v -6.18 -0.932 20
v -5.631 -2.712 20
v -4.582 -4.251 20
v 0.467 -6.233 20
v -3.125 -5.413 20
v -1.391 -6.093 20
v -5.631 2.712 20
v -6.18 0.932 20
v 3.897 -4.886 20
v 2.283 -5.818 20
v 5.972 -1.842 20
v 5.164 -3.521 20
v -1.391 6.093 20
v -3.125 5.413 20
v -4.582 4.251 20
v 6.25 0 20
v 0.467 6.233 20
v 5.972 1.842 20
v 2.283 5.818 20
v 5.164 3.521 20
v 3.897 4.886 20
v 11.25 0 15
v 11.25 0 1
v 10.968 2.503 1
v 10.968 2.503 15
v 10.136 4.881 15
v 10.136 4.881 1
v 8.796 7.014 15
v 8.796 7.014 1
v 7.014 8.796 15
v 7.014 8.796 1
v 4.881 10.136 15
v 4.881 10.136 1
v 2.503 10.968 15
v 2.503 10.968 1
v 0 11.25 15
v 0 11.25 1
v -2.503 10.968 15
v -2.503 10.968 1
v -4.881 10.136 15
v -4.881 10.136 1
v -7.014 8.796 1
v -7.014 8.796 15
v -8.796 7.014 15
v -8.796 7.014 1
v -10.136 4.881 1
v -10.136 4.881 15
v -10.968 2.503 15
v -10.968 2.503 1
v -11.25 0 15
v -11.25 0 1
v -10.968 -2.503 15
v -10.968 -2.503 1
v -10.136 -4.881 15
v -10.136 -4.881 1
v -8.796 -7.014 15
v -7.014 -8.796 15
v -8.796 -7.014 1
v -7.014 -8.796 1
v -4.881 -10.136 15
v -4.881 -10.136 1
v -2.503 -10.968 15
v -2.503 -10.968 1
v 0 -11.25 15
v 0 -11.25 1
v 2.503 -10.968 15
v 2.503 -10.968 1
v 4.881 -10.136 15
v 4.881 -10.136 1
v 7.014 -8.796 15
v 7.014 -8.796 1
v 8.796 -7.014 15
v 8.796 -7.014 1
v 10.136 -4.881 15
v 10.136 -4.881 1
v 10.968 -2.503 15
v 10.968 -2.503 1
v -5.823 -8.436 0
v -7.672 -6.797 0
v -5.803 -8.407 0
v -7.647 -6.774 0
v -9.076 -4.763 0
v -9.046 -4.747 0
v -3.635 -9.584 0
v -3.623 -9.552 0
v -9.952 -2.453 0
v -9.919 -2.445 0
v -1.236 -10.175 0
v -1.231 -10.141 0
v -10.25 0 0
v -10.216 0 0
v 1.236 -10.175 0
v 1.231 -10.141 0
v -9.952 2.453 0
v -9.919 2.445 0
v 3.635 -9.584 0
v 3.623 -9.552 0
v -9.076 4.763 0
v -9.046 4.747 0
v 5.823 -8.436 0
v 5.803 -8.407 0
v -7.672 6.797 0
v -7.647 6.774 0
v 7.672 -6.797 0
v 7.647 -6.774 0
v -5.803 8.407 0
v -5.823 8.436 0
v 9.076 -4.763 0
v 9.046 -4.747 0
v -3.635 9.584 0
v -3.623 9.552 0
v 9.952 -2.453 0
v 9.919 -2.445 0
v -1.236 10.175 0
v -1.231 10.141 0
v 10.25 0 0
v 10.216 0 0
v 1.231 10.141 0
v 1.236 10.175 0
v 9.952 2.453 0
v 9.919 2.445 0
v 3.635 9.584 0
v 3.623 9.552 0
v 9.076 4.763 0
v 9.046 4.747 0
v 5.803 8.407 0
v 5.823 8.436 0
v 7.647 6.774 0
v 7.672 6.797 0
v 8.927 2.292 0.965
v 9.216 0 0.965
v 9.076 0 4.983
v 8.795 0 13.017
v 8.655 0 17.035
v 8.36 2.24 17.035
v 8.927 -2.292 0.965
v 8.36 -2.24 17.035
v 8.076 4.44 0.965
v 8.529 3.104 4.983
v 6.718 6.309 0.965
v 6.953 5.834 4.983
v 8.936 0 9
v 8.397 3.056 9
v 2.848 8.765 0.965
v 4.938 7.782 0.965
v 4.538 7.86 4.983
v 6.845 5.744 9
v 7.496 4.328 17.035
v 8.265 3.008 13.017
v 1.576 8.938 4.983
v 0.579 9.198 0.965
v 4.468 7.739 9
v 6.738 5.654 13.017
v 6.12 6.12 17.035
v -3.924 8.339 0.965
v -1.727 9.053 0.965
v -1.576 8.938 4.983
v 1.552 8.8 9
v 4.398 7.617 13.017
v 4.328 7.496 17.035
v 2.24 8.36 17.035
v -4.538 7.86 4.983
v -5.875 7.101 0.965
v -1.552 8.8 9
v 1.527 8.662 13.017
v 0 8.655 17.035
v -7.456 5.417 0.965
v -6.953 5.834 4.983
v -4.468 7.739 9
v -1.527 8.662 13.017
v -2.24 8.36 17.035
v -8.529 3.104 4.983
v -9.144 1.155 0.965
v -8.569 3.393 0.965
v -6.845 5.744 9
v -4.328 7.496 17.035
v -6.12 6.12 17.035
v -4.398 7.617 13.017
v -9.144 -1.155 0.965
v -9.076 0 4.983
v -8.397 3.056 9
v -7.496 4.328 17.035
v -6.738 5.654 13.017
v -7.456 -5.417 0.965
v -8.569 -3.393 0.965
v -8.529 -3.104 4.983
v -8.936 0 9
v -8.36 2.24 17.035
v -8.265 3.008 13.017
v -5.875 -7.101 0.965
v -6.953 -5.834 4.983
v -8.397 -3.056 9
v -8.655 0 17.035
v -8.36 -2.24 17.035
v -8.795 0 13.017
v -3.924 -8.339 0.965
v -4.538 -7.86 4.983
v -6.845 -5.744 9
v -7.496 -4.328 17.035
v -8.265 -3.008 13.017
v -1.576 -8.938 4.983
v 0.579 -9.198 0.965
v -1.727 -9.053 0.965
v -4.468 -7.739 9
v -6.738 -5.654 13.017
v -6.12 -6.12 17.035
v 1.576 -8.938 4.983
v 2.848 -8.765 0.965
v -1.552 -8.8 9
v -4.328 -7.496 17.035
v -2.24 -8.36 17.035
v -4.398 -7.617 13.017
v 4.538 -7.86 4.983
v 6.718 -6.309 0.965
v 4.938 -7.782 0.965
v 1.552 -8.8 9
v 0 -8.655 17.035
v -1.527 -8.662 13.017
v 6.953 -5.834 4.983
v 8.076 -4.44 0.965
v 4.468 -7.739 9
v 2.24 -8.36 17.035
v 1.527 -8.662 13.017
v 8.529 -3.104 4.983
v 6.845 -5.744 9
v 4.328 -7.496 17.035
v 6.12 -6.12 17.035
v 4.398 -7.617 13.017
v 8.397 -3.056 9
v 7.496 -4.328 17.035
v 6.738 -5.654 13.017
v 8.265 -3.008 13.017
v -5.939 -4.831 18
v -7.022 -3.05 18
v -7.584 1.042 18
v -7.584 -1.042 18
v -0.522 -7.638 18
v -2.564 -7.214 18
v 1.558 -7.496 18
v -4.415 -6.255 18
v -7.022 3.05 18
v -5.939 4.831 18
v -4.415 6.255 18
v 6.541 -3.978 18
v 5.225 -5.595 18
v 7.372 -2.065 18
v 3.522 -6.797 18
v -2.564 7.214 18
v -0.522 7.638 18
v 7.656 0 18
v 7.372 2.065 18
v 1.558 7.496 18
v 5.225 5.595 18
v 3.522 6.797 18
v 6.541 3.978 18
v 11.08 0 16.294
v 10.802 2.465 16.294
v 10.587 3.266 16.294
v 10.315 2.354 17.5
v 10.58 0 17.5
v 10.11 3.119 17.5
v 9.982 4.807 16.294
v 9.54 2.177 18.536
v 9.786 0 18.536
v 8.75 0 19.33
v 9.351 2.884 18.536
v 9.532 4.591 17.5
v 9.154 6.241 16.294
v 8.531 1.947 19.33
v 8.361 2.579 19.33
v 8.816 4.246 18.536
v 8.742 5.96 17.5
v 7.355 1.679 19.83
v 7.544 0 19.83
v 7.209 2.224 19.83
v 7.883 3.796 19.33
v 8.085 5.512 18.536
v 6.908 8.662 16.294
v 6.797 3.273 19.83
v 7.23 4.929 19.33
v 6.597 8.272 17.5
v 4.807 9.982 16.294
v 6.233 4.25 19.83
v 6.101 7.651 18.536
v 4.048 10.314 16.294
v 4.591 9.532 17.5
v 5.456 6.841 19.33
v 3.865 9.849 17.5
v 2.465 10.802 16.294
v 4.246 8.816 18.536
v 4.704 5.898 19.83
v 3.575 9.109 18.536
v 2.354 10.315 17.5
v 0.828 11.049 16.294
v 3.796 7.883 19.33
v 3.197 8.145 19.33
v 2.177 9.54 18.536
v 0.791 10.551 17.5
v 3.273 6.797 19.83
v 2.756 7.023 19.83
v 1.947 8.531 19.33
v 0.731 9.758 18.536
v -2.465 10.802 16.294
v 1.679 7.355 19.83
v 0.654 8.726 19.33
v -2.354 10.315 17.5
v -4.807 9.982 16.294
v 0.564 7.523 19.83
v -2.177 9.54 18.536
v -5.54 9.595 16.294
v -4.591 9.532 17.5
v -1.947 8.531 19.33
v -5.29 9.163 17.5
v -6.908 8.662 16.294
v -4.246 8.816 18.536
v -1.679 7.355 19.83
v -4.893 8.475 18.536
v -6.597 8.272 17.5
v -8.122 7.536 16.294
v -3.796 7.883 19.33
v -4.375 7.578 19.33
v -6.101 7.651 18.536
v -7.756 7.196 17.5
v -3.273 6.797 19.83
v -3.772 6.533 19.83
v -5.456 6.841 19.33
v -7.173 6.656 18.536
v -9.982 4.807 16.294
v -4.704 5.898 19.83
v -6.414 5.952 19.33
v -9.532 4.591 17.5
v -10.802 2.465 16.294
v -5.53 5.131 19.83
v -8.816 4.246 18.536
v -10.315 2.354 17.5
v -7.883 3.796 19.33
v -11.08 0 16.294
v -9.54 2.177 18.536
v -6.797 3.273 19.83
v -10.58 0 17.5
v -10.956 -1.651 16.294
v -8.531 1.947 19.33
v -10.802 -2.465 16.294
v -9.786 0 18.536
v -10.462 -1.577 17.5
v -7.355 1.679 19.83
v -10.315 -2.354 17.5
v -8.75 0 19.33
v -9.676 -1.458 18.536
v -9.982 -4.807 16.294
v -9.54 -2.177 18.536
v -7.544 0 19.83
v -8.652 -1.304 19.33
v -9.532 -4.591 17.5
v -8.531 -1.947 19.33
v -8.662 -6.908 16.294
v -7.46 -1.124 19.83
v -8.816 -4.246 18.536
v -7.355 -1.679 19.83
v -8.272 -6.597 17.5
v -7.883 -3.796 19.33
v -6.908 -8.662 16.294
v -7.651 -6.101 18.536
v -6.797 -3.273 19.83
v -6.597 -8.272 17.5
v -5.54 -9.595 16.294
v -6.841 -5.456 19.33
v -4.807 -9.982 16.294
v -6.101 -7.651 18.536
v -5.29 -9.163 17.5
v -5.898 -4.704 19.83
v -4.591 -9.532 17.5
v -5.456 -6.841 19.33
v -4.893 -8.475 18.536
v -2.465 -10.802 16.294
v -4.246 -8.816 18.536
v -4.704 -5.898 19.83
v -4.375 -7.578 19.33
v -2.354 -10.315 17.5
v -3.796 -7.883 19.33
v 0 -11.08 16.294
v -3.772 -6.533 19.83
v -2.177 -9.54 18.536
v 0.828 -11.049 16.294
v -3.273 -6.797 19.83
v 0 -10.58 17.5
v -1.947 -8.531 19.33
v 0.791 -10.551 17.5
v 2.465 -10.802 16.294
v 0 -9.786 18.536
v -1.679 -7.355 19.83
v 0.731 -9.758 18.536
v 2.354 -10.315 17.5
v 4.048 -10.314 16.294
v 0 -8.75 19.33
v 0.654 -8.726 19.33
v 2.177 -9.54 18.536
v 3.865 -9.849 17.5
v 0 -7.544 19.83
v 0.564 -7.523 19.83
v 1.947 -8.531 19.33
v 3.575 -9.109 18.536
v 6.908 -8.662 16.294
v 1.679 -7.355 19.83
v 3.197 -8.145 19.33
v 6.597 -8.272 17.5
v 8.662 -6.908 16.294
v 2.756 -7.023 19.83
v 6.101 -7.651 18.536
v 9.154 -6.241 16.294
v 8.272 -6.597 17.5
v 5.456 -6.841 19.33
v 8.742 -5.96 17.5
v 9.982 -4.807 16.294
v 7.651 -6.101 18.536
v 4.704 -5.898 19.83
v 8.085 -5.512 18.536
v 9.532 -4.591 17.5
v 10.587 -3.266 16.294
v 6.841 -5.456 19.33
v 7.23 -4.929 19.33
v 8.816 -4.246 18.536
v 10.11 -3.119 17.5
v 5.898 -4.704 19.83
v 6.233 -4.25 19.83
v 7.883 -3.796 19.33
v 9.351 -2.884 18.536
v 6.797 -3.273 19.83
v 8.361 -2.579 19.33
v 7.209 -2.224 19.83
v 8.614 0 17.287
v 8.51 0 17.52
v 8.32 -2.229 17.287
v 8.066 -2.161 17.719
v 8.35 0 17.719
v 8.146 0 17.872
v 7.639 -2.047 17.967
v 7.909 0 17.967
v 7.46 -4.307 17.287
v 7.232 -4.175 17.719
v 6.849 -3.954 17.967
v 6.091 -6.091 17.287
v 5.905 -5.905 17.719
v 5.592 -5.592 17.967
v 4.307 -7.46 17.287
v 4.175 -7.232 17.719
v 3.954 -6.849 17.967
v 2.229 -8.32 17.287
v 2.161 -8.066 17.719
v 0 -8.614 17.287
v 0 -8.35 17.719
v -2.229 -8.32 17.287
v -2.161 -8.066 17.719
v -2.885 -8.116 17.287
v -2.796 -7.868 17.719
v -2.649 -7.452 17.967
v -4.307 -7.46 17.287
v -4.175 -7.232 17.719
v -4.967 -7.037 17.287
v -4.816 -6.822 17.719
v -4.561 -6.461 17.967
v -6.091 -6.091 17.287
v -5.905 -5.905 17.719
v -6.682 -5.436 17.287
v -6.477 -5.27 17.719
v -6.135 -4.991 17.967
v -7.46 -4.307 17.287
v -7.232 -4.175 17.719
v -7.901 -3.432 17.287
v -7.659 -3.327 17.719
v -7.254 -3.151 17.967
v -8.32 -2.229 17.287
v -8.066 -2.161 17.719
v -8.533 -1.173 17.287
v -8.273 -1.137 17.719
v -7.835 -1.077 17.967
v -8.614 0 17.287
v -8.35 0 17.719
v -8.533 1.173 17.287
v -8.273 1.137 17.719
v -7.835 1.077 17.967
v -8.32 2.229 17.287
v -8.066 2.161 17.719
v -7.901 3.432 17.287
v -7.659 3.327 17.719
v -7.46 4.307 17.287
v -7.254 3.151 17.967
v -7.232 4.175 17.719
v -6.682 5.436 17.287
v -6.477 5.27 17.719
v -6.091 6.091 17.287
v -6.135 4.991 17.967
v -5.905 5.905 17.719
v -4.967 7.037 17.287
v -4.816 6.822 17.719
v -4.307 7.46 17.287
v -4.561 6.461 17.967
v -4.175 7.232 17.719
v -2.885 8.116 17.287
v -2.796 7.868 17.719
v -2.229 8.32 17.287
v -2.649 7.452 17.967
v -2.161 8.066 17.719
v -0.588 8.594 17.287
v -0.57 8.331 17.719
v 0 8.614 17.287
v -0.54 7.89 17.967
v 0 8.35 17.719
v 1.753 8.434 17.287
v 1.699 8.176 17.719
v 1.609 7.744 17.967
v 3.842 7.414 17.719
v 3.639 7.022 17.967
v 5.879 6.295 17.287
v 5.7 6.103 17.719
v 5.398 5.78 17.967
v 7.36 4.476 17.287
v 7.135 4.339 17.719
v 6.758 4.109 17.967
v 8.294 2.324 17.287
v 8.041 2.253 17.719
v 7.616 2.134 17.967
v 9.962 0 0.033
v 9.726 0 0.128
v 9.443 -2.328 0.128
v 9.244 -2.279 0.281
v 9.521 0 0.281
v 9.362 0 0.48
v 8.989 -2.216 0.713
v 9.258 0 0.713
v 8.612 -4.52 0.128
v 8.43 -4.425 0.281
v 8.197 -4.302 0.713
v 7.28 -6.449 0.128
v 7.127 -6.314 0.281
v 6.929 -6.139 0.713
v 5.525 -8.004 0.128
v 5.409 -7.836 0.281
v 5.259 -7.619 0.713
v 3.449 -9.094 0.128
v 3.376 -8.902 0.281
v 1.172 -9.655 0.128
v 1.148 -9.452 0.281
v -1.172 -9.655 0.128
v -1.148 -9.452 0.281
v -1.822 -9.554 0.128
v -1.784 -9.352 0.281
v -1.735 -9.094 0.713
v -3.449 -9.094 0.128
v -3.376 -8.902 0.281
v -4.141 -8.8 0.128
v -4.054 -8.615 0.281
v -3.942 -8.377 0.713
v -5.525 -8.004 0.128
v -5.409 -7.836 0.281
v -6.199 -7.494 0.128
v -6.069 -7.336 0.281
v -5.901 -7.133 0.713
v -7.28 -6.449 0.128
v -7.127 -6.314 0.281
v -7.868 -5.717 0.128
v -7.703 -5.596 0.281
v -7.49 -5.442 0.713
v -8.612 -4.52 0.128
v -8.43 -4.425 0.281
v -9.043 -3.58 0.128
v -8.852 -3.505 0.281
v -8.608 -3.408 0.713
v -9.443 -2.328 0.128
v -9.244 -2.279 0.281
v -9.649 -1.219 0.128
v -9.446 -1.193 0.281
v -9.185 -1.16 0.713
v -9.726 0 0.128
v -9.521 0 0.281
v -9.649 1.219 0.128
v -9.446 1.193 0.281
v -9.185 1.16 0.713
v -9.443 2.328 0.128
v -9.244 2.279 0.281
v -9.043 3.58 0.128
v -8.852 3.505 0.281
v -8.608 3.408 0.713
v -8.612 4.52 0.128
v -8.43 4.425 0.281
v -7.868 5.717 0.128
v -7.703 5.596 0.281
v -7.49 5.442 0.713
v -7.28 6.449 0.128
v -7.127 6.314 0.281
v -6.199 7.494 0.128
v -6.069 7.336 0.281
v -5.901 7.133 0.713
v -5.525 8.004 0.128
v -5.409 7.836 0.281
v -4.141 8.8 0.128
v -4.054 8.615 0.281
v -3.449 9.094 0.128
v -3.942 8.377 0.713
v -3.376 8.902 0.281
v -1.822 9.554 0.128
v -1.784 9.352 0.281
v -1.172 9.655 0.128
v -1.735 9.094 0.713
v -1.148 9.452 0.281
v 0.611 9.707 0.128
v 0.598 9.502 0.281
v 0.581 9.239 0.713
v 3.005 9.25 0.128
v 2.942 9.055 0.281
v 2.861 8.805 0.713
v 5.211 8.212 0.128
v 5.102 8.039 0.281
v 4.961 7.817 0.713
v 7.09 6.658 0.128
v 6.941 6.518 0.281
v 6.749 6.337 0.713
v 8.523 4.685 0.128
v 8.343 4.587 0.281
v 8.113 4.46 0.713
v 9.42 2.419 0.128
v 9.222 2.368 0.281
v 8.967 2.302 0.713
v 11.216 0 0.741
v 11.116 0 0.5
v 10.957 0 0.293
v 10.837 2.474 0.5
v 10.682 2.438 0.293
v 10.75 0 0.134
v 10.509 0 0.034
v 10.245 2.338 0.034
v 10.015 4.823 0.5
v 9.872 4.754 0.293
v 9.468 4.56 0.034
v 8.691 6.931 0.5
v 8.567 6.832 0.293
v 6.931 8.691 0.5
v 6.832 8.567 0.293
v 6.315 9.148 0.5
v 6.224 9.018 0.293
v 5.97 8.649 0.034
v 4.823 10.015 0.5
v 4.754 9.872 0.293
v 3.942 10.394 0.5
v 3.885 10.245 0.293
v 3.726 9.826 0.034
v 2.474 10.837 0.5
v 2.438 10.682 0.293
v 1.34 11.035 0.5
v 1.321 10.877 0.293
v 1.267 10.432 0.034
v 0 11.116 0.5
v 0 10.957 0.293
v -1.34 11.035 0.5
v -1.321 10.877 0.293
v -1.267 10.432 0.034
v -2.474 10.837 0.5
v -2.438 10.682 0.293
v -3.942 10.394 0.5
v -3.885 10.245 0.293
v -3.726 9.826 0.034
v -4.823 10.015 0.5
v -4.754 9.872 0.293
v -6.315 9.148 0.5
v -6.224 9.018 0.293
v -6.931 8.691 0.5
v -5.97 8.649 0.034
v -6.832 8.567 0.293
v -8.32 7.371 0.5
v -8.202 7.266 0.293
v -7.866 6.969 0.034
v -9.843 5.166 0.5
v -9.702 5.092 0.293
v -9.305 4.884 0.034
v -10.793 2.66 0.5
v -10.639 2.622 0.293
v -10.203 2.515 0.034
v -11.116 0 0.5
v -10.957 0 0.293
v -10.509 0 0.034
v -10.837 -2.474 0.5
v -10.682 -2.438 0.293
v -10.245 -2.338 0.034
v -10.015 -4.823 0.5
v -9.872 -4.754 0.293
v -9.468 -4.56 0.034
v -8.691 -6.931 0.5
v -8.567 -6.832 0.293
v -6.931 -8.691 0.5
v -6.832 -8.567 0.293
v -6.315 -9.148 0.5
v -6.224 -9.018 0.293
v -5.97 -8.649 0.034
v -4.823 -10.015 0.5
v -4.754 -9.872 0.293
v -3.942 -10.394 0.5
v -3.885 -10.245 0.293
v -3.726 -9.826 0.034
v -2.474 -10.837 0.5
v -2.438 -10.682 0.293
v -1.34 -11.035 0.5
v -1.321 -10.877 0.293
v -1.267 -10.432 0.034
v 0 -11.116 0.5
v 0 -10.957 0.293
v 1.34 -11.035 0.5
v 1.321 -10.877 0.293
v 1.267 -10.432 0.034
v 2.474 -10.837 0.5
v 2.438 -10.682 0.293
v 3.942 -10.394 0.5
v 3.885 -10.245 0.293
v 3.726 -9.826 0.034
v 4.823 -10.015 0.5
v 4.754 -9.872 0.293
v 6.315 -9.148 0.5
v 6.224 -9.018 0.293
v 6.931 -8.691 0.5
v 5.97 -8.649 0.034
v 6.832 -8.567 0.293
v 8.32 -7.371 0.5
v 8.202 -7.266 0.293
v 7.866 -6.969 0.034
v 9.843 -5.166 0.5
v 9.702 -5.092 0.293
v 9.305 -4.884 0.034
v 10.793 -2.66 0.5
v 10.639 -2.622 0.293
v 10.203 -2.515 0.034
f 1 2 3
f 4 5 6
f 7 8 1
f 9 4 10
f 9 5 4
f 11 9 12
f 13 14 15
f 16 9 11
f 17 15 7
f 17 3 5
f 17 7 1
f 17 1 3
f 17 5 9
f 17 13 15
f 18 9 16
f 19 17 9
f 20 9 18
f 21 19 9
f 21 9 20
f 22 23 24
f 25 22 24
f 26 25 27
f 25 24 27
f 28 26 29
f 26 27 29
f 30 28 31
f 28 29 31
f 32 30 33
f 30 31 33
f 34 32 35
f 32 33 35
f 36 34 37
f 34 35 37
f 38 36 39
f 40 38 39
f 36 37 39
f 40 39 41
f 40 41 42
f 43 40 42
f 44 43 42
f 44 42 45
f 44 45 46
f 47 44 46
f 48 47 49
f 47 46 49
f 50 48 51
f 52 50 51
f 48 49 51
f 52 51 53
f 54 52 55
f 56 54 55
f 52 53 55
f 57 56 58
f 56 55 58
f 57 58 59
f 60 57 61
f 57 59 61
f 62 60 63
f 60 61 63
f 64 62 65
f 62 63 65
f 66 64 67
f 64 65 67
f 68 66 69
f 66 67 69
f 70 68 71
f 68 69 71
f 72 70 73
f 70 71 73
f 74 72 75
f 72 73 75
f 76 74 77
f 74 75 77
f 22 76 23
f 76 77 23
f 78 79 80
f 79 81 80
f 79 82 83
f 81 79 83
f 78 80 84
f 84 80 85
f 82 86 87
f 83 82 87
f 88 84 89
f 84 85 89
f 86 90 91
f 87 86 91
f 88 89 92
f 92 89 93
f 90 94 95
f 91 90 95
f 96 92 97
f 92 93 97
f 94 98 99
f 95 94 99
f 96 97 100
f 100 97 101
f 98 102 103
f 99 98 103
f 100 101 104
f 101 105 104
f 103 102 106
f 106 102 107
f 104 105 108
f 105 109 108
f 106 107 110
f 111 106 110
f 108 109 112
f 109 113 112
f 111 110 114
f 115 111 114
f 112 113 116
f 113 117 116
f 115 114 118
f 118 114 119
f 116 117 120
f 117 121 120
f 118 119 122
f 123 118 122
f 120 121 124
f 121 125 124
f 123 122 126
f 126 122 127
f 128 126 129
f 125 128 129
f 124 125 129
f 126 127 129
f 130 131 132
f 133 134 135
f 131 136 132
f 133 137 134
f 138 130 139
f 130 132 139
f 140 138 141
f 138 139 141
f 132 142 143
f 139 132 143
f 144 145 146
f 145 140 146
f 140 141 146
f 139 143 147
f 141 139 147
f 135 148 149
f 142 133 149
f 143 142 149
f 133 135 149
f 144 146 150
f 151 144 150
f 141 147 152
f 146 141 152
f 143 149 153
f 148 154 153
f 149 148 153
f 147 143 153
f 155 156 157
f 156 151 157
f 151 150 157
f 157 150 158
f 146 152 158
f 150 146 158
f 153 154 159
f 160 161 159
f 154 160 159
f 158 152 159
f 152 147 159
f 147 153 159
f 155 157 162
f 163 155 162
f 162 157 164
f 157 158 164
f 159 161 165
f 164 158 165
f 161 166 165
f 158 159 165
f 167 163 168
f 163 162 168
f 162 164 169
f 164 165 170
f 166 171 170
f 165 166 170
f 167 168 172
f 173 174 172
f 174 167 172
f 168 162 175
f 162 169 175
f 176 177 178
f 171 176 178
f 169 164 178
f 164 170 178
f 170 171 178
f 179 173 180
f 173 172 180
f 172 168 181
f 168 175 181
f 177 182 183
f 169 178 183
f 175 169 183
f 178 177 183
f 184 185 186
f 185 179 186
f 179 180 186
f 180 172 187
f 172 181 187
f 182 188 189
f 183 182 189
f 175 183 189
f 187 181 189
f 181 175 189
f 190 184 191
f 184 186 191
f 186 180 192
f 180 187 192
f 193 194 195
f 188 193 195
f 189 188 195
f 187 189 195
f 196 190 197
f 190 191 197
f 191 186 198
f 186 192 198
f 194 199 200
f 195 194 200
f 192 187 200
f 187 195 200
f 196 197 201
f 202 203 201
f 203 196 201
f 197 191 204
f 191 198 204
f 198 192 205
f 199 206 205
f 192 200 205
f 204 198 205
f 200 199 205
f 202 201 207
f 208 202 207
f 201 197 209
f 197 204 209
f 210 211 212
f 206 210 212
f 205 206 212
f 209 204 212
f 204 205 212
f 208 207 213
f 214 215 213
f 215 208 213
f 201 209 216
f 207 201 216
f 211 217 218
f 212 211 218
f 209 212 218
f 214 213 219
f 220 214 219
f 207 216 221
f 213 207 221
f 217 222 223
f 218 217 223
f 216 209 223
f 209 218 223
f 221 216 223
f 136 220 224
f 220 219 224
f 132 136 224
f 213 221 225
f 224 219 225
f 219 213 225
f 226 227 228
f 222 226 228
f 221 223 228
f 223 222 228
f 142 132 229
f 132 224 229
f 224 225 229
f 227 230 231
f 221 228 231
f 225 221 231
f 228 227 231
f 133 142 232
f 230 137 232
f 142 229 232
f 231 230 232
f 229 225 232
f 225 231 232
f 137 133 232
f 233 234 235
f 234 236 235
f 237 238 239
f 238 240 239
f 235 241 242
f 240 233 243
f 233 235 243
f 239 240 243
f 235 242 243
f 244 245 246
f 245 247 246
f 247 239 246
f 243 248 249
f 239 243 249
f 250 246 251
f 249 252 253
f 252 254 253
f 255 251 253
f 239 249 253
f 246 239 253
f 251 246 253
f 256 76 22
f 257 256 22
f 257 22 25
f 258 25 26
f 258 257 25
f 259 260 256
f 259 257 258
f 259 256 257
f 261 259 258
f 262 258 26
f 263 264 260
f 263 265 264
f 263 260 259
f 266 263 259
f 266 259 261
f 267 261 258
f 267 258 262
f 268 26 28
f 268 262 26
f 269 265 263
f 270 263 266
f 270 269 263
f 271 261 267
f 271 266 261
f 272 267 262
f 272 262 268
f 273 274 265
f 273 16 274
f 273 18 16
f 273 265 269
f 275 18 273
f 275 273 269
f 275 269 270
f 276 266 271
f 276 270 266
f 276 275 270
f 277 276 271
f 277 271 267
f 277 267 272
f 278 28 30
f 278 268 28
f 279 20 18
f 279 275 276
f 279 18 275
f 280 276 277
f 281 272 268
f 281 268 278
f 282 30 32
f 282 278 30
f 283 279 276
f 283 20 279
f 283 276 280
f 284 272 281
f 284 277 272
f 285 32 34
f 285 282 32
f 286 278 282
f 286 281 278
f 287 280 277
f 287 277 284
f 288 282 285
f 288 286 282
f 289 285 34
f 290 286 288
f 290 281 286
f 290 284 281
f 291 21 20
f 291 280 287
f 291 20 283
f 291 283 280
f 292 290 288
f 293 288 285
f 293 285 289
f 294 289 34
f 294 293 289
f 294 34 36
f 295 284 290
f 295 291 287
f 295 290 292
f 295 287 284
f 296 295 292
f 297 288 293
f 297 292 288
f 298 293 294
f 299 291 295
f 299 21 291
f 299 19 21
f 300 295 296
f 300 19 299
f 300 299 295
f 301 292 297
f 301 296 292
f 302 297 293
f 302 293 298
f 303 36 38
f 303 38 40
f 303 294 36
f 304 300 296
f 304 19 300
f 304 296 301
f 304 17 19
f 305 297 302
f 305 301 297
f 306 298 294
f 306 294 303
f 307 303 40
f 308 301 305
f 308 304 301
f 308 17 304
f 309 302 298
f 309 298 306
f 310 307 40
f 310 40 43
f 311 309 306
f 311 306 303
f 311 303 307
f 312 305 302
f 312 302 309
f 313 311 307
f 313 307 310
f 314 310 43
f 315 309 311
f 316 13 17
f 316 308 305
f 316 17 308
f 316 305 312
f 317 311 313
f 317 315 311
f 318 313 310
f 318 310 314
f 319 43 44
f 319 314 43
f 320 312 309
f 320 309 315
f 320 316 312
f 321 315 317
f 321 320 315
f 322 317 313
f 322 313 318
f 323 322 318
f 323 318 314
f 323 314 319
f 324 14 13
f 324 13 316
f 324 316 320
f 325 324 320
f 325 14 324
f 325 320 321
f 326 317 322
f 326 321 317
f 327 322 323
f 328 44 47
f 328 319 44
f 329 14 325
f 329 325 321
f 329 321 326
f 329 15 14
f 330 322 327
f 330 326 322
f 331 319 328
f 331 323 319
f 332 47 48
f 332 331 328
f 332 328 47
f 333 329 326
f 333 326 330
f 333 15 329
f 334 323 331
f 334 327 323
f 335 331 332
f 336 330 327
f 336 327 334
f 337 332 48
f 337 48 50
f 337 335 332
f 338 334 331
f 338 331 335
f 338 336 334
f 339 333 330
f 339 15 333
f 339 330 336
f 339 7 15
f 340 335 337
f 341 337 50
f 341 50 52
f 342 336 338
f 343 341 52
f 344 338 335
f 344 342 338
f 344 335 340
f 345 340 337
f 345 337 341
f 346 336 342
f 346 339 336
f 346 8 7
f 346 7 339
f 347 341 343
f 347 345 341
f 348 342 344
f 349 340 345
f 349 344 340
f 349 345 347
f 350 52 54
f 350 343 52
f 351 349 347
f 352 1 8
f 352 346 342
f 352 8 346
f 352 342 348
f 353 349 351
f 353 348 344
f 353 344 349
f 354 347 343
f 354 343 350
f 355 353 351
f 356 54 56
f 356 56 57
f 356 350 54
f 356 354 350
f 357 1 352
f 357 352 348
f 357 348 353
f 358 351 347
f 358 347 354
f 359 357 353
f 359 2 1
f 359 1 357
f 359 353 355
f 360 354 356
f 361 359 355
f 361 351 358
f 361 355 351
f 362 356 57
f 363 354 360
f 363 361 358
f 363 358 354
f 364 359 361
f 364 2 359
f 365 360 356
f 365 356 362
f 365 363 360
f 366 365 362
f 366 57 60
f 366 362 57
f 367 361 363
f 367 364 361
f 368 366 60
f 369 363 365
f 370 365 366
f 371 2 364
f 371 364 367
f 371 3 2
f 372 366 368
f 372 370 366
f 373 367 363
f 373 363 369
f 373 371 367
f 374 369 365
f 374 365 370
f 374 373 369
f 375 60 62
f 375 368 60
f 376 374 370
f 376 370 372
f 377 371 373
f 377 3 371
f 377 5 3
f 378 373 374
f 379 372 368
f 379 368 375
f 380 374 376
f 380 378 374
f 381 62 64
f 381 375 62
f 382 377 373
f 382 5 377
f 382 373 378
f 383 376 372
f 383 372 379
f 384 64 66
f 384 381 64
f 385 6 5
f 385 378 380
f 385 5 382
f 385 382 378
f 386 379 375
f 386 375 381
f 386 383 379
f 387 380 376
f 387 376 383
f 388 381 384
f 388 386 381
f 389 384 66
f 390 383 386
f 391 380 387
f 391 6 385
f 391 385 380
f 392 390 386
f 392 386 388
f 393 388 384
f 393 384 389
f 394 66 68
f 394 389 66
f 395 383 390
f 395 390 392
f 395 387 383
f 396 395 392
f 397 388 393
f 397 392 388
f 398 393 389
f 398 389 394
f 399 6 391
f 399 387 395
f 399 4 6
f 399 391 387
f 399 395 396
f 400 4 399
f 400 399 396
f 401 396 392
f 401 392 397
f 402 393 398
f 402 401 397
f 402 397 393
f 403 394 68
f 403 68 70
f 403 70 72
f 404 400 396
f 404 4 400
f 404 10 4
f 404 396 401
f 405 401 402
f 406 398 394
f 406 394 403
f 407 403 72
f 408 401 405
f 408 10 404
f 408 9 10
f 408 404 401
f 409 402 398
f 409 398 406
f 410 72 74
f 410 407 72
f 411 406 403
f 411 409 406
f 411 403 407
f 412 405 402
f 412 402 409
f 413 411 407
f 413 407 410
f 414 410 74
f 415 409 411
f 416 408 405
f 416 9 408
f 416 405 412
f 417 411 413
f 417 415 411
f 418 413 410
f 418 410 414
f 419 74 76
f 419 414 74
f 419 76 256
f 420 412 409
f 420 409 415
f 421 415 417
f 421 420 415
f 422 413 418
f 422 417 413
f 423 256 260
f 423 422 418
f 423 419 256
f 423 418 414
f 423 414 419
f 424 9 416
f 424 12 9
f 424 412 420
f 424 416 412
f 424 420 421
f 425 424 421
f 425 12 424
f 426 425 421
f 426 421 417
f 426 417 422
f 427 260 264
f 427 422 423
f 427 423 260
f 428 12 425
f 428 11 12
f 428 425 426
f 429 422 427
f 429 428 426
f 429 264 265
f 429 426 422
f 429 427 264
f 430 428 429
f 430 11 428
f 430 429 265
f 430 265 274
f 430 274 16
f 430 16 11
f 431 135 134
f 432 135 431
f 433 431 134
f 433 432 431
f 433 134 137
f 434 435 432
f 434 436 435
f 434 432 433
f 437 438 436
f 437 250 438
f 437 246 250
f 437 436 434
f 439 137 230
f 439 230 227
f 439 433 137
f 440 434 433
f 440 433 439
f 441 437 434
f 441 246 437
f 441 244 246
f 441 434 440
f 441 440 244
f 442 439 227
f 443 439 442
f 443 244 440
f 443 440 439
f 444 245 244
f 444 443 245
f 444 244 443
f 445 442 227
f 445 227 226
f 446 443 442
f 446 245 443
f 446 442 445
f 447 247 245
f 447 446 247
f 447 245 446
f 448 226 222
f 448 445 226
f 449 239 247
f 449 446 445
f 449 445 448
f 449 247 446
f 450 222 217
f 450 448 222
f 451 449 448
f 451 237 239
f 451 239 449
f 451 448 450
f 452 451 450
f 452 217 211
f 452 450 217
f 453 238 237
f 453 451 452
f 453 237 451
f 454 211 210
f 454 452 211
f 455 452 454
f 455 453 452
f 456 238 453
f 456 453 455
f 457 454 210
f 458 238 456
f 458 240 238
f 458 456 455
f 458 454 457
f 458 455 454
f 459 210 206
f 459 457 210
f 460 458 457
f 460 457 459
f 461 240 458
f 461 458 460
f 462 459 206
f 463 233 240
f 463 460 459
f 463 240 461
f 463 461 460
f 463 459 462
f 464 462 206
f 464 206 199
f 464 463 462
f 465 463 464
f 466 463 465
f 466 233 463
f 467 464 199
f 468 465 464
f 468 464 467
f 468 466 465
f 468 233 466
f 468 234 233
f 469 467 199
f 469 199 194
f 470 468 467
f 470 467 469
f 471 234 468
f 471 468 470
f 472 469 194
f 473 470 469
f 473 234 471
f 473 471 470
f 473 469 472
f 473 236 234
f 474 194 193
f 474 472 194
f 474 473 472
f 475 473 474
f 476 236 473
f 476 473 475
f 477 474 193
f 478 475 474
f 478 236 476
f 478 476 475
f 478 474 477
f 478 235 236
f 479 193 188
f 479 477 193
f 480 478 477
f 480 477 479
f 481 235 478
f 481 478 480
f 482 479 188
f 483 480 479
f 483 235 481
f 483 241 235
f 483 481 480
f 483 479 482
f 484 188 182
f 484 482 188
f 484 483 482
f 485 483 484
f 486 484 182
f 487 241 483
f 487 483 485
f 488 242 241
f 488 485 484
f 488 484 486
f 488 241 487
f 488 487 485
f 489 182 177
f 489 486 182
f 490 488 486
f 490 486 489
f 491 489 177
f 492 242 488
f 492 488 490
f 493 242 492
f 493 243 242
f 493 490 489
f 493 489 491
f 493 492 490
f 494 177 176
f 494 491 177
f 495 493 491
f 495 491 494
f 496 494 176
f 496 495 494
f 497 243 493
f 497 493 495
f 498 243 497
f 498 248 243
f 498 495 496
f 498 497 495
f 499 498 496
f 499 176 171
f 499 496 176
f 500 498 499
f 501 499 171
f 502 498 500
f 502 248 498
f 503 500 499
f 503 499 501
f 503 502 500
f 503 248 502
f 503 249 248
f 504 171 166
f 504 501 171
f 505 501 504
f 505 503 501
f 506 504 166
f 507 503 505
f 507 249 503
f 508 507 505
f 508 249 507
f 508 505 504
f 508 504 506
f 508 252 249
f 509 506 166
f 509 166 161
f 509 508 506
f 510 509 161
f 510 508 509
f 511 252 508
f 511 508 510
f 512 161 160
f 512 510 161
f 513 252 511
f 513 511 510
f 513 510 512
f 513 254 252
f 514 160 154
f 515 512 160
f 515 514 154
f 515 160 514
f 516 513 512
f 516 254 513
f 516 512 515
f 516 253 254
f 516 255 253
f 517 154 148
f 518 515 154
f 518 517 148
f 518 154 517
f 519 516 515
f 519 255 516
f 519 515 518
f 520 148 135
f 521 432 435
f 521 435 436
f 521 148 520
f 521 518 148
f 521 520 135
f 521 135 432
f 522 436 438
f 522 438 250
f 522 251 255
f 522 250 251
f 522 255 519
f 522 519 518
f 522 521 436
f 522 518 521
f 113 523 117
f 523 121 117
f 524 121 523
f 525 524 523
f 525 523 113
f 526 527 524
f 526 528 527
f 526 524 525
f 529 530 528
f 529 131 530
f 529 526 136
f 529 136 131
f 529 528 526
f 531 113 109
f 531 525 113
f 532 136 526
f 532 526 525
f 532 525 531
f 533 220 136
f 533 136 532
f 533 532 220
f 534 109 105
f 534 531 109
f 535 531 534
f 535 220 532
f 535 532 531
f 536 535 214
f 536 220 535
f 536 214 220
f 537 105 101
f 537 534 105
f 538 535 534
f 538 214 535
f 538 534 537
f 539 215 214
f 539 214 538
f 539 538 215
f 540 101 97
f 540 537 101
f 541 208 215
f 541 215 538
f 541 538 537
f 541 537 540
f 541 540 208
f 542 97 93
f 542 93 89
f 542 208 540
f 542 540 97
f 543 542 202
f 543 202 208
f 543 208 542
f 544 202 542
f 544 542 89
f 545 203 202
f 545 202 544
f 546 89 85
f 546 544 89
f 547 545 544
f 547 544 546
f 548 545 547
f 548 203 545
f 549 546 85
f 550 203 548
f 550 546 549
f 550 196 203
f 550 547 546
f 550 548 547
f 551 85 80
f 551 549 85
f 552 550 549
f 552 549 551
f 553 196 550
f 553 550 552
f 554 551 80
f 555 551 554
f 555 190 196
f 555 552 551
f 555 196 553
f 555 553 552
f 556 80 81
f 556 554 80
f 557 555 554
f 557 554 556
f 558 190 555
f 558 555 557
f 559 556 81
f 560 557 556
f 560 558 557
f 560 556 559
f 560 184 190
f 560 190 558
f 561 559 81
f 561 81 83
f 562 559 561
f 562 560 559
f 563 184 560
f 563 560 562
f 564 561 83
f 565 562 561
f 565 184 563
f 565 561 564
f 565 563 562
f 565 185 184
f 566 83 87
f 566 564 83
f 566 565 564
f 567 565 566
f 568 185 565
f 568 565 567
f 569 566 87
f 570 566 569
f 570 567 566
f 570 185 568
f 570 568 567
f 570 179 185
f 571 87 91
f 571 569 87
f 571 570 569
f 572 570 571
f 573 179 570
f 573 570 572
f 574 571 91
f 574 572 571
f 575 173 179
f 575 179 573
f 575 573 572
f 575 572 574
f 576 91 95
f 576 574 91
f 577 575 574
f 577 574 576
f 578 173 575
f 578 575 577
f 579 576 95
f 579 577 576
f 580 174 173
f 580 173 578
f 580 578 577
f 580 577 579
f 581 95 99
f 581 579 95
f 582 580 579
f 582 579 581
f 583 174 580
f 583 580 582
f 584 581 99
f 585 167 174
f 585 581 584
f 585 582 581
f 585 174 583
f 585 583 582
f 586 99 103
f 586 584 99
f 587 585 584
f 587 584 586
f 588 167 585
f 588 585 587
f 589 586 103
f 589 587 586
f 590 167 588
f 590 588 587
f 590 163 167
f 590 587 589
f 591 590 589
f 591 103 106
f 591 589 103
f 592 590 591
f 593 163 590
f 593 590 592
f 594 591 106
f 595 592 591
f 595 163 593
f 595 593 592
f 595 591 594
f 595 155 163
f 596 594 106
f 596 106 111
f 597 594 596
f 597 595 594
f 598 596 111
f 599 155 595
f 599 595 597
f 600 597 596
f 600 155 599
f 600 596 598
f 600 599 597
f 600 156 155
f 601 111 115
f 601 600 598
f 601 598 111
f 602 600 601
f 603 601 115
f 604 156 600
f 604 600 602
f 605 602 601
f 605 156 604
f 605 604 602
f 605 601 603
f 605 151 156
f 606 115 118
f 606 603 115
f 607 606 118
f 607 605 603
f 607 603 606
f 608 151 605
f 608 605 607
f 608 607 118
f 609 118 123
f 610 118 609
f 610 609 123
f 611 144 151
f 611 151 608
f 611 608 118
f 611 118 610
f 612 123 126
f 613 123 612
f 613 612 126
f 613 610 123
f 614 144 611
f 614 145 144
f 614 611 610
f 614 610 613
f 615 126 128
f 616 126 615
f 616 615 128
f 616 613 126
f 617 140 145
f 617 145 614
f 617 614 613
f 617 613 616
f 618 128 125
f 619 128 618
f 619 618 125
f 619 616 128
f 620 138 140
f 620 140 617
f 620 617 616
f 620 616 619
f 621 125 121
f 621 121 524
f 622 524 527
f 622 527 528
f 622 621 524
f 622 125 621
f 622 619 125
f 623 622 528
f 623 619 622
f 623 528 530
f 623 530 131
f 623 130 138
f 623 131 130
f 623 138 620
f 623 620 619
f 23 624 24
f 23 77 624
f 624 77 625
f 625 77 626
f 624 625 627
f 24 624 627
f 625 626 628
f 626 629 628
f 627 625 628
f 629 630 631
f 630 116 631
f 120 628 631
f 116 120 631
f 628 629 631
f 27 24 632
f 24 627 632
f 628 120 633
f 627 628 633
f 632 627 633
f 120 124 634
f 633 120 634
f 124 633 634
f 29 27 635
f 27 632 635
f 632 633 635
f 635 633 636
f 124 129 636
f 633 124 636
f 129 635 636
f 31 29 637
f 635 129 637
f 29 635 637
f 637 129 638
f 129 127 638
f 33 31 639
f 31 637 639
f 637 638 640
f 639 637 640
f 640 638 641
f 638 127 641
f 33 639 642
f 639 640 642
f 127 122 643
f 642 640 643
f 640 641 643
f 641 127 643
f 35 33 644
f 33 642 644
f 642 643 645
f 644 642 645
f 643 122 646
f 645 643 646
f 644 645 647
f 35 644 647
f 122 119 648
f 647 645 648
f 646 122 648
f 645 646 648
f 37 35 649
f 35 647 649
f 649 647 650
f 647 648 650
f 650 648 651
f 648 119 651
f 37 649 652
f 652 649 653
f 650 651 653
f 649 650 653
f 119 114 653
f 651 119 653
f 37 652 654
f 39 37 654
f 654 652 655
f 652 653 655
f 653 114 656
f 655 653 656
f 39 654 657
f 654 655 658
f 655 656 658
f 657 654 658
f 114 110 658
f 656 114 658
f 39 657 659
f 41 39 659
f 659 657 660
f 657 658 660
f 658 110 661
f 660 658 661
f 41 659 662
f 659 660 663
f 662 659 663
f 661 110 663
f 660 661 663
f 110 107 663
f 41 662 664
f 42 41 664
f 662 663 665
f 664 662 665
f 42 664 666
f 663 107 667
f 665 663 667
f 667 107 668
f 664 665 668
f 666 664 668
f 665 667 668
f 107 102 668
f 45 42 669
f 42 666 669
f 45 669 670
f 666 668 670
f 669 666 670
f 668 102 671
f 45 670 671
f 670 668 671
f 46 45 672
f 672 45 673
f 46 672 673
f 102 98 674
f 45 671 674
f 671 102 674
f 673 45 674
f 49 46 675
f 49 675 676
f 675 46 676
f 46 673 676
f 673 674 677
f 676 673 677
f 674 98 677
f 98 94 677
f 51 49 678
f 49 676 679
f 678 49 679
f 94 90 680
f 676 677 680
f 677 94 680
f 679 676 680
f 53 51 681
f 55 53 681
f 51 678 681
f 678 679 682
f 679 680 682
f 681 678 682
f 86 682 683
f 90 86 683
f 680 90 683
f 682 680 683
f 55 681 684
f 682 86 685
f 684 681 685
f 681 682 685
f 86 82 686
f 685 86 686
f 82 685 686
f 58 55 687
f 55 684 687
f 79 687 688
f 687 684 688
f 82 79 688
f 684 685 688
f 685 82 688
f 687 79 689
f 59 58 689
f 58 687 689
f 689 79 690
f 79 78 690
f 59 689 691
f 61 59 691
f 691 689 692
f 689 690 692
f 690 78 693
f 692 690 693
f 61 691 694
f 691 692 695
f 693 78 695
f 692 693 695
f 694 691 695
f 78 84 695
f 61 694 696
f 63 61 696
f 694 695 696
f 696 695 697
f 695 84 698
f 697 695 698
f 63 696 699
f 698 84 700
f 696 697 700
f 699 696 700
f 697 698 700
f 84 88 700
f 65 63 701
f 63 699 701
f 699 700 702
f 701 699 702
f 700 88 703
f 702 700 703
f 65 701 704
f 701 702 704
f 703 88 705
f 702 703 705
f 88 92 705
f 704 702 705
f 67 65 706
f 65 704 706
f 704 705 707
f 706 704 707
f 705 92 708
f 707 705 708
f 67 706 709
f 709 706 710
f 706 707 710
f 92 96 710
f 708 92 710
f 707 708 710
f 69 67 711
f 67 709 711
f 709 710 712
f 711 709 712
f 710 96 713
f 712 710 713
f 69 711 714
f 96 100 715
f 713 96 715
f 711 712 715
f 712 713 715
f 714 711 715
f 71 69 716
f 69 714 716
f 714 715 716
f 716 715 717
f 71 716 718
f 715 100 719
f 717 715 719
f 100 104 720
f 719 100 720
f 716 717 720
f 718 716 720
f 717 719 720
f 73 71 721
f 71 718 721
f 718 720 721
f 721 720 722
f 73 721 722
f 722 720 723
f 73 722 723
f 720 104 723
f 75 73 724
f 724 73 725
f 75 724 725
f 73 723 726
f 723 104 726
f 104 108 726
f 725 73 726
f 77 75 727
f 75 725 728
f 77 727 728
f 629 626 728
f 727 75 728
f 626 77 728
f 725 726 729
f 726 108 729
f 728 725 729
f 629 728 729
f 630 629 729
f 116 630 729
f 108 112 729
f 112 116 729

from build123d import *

# Parameters (mm, degrees)
F0_R     = 11.25
F0_R_2   = 9.25
F1_DEPTH = 20
F2_DEPTH = 18
F2_TAPER = 2
F3_R     = 5
F4_R     = 1


with BuildPart() as f1:
    # F0 (on Top) → F1 (new body)
    with BuildSketch(Plane.XY):
        Circle(F0_R)
        Circle(F0_R_2, mode=Mode.SUBTRACT)
        Circle(F0_R_2)
    extrude(amount=F1_DEPTH)

    # F0 (on Top) → F2 (cut)
    with BuildSketch(Plane.XY):
        Circle(F0_R_2)
    extrude(amount=F2_DEPTH, taper=F2_TAPER, mode=Mode.SUBTRACT)

    # F3
    f3_edges = [f1.edges().sort_by_distance(p)[0] for p in [
        (-11.25, 0, 20),
    ]]
    fillet(f3_edges, radius=F3_R)

    # F4
    f4_edges = [f1.edges().sort_by_distance(p)[0] for p in [
        (11.25, 0, 7.5),
        (-11.25, 0, 15),
        (-11.25, 0, 0),
        (-9.25, 0, 0),
        (8.935713, 0, 9),
        (-8.621426, 0, 18),
    ]]
    fillet(f4_edges, radius=F4_R)


solid = f1.part
